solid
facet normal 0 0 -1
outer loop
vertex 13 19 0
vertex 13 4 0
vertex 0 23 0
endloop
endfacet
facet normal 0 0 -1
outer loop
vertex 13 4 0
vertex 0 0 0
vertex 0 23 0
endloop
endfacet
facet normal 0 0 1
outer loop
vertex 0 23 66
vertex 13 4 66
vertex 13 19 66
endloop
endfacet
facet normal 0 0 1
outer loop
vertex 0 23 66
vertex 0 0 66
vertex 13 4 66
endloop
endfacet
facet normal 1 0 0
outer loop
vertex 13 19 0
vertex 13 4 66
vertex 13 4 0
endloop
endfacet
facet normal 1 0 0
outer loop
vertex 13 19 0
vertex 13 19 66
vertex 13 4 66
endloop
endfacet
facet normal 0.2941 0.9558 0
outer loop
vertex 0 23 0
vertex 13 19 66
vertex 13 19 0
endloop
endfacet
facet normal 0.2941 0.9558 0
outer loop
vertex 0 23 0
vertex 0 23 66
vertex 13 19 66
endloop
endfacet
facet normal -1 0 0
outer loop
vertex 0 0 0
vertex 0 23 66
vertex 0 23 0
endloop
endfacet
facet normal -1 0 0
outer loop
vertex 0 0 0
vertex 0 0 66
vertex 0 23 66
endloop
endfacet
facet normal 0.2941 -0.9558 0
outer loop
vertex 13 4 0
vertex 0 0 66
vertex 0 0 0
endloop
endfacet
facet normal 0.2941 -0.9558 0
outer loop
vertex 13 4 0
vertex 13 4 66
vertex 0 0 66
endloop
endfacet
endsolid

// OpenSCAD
linear_extrude(height=66) polygon(points=[[0,0],[0,23],[13,19],[13,4]]);
